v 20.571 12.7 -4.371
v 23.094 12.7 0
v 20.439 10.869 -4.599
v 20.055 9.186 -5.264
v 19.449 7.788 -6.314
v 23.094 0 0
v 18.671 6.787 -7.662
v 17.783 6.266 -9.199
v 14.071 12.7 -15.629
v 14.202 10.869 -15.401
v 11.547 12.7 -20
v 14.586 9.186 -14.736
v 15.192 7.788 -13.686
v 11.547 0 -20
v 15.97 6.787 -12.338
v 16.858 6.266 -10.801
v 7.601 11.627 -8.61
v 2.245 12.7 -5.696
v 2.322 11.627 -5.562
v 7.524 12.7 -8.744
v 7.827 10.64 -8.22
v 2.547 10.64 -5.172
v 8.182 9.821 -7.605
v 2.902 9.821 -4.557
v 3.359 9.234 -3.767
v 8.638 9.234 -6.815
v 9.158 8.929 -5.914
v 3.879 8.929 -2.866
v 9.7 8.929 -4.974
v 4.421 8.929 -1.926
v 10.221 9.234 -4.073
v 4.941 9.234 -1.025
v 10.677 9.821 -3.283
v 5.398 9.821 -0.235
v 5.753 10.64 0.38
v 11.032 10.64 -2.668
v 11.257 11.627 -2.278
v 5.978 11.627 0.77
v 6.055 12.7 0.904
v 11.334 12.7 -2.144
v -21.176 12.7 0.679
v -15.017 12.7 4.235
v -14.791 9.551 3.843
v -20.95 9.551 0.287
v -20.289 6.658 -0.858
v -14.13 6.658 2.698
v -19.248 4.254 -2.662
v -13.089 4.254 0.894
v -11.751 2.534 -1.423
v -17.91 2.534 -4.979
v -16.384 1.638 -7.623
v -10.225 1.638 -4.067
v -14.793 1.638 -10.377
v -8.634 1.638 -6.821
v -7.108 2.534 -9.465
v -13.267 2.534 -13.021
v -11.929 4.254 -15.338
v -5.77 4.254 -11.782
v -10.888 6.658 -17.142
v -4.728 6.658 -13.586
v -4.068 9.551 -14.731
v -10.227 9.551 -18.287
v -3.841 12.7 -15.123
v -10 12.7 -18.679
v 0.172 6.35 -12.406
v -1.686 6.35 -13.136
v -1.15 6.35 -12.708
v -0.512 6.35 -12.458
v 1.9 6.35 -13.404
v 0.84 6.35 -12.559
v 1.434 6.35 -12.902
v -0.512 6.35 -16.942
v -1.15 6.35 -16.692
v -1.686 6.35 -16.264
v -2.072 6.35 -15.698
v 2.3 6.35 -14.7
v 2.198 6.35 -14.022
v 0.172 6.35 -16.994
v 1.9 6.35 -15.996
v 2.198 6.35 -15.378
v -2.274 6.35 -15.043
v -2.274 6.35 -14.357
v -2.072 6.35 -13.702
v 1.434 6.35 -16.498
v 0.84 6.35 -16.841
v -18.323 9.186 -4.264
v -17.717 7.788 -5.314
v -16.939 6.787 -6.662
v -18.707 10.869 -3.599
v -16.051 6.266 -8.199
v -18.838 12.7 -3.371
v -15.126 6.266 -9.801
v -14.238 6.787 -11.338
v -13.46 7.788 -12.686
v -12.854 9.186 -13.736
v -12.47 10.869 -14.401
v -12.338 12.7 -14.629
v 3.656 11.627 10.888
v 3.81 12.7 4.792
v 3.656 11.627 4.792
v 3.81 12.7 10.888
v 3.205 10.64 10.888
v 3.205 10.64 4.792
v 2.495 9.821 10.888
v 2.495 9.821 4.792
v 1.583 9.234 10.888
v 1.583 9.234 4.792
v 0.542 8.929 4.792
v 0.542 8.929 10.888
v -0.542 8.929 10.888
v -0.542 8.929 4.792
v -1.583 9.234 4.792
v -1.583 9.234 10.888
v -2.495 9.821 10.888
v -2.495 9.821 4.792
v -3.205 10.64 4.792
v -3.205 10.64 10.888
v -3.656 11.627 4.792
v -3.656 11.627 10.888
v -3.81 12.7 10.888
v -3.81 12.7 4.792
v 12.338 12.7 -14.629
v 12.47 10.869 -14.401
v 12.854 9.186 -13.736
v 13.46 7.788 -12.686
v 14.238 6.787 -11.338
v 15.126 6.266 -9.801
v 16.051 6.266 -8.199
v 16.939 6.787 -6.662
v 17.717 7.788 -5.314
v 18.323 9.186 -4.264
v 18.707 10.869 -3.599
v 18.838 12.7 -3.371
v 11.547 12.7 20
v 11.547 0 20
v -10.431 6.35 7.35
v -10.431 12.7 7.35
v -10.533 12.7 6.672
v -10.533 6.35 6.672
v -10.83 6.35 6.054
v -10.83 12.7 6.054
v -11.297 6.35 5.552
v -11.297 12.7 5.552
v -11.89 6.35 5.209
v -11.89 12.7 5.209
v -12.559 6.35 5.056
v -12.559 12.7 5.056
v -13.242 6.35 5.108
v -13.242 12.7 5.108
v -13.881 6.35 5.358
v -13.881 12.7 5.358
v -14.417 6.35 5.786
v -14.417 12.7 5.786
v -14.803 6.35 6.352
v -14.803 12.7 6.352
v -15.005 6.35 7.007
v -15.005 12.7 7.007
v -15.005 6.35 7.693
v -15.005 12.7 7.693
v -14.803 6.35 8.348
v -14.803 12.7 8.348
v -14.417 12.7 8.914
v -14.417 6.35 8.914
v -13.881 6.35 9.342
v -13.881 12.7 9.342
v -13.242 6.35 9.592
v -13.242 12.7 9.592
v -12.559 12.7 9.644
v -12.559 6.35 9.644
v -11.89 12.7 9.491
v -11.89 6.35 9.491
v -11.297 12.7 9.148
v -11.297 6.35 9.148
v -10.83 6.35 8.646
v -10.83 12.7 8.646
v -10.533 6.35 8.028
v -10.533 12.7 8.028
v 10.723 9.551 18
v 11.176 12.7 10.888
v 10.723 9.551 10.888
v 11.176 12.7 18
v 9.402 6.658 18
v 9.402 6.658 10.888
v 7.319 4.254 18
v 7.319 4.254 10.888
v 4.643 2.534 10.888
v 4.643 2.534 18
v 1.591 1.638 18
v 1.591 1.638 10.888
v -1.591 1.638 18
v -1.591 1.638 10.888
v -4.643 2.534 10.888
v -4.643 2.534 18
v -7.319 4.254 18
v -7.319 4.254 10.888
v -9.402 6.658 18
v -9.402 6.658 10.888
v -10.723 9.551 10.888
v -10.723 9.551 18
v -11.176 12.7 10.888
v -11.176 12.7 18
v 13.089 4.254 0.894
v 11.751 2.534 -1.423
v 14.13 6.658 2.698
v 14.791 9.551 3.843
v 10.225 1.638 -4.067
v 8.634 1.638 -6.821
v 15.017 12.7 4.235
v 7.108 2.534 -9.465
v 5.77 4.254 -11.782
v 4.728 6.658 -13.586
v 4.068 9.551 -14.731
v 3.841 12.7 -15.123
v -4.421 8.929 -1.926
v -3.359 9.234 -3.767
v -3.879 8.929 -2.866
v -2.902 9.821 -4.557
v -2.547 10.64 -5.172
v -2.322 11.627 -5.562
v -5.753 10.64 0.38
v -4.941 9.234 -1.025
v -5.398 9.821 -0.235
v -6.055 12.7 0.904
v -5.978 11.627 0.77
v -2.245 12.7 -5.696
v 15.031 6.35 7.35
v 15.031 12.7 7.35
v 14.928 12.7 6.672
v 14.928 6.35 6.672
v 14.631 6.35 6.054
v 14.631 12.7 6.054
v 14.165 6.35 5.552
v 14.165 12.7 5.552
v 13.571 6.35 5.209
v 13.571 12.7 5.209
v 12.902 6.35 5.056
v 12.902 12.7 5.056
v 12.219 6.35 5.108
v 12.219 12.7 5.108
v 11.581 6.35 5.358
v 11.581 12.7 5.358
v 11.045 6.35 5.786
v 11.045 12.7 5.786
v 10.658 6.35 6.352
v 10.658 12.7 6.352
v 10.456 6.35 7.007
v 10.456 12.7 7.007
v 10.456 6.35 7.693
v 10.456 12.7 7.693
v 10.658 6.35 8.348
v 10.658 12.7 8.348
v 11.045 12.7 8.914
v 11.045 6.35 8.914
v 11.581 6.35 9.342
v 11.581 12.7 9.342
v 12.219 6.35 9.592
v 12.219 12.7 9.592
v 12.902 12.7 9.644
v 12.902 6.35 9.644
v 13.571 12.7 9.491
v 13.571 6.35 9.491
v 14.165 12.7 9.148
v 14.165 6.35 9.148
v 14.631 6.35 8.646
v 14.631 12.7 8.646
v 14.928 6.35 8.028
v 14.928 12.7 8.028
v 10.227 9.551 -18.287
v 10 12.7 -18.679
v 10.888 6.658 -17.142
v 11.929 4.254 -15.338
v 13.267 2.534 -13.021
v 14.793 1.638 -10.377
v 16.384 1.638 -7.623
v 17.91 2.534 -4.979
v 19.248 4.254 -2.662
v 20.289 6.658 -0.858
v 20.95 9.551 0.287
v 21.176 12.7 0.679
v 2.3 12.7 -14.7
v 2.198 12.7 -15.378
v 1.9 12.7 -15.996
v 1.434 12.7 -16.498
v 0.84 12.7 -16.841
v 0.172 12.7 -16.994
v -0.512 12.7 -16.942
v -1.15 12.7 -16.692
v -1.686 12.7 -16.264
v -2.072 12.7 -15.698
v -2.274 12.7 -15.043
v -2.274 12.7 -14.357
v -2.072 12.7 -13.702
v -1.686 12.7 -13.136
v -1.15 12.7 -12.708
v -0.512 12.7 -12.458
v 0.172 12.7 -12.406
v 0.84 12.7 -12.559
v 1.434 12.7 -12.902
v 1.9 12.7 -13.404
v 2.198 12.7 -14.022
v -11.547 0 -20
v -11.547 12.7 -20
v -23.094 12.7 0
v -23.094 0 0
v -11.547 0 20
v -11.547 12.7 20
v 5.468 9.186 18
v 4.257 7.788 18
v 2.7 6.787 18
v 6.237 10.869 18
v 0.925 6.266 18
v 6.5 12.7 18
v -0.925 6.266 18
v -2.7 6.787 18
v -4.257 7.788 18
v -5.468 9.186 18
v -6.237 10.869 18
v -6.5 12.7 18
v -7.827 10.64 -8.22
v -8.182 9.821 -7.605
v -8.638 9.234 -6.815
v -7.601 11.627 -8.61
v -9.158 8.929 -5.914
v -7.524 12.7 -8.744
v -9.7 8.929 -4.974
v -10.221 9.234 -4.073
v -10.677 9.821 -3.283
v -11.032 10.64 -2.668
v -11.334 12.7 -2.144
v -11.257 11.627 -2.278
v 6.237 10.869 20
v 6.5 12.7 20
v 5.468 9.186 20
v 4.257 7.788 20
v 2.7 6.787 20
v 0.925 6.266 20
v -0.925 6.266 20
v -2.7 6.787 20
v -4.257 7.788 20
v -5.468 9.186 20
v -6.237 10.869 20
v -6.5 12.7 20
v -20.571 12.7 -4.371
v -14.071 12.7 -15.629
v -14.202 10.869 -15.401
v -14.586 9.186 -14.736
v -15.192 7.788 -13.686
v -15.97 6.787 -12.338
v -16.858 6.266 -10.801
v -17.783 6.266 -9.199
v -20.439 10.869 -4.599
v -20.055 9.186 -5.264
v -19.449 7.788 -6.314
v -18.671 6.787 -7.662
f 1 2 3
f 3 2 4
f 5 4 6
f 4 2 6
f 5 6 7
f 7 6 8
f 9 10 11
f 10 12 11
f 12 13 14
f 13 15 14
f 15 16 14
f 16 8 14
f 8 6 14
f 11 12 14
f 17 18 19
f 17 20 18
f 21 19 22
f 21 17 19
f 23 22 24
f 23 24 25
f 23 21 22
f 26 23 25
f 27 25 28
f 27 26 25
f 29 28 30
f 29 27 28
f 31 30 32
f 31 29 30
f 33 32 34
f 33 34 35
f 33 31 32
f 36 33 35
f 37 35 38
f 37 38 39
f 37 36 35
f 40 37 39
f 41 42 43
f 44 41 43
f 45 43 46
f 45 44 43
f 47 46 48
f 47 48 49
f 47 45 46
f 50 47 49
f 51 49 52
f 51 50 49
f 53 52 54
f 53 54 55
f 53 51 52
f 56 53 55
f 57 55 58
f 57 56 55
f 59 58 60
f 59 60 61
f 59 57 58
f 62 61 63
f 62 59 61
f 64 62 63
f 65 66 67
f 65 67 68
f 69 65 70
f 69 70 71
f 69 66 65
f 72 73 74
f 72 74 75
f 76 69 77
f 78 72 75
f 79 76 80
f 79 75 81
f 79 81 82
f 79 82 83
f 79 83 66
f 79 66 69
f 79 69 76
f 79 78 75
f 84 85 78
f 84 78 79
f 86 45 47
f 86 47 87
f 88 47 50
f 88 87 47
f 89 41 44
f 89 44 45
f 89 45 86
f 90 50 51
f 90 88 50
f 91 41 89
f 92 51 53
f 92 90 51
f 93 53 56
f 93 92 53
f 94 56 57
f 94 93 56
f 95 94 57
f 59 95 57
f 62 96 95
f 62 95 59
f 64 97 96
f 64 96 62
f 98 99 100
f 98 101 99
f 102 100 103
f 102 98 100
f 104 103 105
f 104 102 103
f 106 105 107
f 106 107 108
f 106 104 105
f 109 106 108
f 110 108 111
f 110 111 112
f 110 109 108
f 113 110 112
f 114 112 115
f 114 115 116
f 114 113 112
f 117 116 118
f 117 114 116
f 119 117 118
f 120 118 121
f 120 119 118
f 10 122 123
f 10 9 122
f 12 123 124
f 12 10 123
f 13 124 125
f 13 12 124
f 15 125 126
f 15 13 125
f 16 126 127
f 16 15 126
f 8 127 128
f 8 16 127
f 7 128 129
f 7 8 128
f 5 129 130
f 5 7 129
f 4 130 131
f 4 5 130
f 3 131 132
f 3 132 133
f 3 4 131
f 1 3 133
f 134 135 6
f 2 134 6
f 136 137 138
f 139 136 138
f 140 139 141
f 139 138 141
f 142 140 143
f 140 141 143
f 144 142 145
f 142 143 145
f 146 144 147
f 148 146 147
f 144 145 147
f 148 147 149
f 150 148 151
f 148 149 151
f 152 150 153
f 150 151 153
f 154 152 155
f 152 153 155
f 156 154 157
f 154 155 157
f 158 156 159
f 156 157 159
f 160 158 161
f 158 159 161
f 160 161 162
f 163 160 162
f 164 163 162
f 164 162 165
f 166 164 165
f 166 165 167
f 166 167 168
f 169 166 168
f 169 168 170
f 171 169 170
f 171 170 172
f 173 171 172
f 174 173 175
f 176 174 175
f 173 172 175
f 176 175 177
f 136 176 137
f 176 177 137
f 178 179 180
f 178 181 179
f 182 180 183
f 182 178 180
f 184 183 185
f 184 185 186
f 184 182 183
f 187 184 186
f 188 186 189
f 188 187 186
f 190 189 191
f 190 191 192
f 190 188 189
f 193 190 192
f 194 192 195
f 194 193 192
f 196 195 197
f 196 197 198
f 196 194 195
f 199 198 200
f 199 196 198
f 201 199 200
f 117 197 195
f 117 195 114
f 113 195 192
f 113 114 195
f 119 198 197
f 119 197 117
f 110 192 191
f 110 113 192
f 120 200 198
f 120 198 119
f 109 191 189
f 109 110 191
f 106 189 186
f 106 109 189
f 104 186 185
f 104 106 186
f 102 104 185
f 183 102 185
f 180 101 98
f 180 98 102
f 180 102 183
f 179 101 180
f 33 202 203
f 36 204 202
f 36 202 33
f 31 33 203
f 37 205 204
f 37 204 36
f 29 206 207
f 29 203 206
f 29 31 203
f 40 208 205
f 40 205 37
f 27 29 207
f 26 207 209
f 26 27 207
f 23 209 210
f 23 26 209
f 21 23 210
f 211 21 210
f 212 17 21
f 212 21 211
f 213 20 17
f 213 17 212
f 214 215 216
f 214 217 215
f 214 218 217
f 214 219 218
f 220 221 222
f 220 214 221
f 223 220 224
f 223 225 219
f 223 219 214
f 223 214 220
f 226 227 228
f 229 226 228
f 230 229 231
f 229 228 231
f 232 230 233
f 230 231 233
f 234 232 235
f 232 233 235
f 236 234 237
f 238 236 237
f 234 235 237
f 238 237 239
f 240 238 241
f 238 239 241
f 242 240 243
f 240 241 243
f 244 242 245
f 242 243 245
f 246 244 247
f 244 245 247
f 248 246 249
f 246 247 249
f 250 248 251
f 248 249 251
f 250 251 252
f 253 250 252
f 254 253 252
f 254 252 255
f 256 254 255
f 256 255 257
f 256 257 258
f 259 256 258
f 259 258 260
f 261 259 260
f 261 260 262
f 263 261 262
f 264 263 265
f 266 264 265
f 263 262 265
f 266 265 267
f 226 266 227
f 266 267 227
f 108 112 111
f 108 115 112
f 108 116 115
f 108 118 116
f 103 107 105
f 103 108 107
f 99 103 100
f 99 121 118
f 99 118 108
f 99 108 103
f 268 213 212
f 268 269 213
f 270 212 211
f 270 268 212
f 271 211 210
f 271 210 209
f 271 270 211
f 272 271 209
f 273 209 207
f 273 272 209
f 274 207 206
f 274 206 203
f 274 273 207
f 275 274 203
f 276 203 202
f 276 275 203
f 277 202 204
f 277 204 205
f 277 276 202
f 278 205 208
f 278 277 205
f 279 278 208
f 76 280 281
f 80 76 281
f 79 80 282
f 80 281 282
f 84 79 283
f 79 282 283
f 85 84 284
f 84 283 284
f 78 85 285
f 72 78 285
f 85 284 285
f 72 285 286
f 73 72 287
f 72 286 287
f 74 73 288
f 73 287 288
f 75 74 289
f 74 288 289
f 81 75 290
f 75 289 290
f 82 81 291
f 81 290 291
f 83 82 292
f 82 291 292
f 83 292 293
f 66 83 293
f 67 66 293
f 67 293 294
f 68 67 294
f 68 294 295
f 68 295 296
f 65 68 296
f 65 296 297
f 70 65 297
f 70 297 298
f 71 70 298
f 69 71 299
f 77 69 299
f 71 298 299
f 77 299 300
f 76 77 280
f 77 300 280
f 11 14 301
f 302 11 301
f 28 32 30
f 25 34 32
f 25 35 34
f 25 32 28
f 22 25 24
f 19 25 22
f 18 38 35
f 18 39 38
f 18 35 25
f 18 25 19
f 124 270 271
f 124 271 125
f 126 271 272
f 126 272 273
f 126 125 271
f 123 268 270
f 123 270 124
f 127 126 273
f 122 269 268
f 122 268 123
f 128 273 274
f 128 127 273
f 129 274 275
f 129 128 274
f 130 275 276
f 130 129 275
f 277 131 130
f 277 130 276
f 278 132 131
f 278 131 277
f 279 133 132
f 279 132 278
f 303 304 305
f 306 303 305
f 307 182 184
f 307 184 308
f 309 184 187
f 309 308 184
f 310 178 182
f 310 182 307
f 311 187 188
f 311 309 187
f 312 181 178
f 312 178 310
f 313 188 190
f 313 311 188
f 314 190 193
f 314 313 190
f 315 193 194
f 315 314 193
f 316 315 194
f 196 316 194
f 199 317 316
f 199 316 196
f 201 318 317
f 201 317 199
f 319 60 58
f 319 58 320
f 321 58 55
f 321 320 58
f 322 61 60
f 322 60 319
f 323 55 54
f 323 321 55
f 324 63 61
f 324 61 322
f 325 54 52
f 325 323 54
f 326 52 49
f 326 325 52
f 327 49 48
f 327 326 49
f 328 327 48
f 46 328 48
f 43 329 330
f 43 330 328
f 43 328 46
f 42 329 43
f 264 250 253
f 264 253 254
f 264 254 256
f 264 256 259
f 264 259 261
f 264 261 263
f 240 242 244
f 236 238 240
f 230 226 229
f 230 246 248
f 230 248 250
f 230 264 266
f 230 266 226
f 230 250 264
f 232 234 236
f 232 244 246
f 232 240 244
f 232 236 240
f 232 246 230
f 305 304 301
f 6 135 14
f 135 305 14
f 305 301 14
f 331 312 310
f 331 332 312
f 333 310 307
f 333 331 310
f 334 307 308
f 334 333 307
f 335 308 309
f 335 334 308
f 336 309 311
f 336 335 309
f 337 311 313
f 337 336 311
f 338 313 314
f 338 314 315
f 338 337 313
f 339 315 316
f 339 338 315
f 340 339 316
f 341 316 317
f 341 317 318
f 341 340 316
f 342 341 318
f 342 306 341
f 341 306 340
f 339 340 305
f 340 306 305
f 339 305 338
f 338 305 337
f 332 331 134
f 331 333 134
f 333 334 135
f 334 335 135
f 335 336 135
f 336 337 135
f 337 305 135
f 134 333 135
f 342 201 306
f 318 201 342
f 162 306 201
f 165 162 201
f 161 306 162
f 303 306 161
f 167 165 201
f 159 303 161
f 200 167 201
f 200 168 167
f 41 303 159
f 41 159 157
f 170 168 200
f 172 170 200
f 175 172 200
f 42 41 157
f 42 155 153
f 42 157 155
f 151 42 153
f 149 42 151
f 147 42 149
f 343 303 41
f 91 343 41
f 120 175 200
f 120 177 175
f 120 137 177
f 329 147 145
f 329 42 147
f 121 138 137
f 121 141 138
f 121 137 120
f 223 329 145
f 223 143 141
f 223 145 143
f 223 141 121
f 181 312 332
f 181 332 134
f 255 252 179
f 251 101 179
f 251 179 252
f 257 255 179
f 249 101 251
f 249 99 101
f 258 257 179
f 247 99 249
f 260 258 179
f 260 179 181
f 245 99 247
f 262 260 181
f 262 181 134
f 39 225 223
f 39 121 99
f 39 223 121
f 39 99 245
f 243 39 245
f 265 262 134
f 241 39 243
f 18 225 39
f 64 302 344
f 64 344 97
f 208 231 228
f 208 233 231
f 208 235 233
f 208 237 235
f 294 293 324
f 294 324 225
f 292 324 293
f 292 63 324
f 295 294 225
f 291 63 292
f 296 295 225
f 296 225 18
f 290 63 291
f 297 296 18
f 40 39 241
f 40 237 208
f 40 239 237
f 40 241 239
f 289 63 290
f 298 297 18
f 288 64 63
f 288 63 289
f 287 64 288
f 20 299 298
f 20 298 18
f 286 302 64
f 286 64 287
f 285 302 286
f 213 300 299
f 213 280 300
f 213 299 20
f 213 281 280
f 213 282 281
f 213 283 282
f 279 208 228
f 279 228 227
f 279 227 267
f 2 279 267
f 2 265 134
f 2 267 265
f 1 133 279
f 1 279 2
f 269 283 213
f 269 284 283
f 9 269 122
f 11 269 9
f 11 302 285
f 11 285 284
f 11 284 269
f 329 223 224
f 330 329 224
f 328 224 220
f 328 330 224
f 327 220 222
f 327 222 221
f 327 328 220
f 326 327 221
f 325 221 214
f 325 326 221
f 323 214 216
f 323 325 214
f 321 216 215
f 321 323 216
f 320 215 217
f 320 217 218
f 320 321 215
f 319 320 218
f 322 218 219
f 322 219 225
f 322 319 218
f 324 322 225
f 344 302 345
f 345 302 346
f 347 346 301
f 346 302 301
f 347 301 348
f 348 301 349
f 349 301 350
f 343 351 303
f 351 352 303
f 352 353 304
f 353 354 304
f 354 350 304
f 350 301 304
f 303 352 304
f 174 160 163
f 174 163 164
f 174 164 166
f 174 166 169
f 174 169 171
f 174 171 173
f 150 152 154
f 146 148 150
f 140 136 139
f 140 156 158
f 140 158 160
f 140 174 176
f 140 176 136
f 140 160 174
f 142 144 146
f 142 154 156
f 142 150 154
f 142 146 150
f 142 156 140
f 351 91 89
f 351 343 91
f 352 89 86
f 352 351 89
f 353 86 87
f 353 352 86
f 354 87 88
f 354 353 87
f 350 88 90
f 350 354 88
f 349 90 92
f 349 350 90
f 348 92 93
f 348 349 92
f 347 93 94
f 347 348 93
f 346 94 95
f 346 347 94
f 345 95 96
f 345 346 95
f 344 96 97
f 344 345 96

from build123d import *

# Parameters (mm, degrees)
BOSS_EXTRUDE1_DEPTH = 12.7
CIRPATTERN1_COUNT   = 3
SKETCH7_R           = 2.3
CUT_EXTRUDE2_DEPTH  = 6.35


with BuildPart() as part:
    # Sketch1 → Boss-Extrude1 (new body)
    with BuildSketch(Plane(origin=(0, 0, 0), x_dir=(1, 0, 0), z_dir=(0, 1, 0))):
        Polygon((11.547005384, -20), (23.094010768, 0), (11.547005384, 20), (-11.547005384, 20), (-23.094010768, 0), (-11.547005384, -20), align=None)
    extrude(amount=BOSS_EXTRUDE1_DEPTH)

    # Sketch5 → Cut-Revolve1 (revolve, cut)
    with BuildSketch(Plane(origin=(0, 12.7, 0), x_dir=(1, 0, 0), z_dir=(0, 1, 0))):
        Polygon((0, -20), (0, -4.792), (-3.81, -4.792), (-3.81, -10.888), (-11.176, -10.888), (-11.176, -18), (-6.5, -18), (-6.5, -20), align=None)
    cut_revolve1 = revolve(axis=Axis((0, 12.7, 20), (0, 0, -1)), mode=Mode.SUBTRACT)

    # CirPattern1: Cut-Revolve1 ×3 about axis
    cirpattern1_axis = Axis((0, -0.635, 0), (0, 1, 0))
    for i in range(1, CIRPATTERN1_COUNT):
        add(cut_revolve1.rotate(cirpattern1_axis, i * 360 / CIRPATTERN1_COUNT), mode=Mode.SUBTRACT)

    # Sketch7 → Cut-Extrude2 (cut)
    with BuildSketch(Plane(origin=(0, 12.7, 0), x_dir=(1, 0, 0), z_dir=(0, 1, 0))):
        with Locations((0, 14.700006)):
            Circle(SKETCH7_R)
        with Locations((12.730575168, -7.349997)):
            Circle(SKETCH7_R)
        with Locations((-12.730575168, -7.349997)):
            Circle(SKETCH7_R)
    extrude(amount=-CUT_EXTRUDE2_DEPTH, mode=Mode.SUBTRACT)


solid = part.part
